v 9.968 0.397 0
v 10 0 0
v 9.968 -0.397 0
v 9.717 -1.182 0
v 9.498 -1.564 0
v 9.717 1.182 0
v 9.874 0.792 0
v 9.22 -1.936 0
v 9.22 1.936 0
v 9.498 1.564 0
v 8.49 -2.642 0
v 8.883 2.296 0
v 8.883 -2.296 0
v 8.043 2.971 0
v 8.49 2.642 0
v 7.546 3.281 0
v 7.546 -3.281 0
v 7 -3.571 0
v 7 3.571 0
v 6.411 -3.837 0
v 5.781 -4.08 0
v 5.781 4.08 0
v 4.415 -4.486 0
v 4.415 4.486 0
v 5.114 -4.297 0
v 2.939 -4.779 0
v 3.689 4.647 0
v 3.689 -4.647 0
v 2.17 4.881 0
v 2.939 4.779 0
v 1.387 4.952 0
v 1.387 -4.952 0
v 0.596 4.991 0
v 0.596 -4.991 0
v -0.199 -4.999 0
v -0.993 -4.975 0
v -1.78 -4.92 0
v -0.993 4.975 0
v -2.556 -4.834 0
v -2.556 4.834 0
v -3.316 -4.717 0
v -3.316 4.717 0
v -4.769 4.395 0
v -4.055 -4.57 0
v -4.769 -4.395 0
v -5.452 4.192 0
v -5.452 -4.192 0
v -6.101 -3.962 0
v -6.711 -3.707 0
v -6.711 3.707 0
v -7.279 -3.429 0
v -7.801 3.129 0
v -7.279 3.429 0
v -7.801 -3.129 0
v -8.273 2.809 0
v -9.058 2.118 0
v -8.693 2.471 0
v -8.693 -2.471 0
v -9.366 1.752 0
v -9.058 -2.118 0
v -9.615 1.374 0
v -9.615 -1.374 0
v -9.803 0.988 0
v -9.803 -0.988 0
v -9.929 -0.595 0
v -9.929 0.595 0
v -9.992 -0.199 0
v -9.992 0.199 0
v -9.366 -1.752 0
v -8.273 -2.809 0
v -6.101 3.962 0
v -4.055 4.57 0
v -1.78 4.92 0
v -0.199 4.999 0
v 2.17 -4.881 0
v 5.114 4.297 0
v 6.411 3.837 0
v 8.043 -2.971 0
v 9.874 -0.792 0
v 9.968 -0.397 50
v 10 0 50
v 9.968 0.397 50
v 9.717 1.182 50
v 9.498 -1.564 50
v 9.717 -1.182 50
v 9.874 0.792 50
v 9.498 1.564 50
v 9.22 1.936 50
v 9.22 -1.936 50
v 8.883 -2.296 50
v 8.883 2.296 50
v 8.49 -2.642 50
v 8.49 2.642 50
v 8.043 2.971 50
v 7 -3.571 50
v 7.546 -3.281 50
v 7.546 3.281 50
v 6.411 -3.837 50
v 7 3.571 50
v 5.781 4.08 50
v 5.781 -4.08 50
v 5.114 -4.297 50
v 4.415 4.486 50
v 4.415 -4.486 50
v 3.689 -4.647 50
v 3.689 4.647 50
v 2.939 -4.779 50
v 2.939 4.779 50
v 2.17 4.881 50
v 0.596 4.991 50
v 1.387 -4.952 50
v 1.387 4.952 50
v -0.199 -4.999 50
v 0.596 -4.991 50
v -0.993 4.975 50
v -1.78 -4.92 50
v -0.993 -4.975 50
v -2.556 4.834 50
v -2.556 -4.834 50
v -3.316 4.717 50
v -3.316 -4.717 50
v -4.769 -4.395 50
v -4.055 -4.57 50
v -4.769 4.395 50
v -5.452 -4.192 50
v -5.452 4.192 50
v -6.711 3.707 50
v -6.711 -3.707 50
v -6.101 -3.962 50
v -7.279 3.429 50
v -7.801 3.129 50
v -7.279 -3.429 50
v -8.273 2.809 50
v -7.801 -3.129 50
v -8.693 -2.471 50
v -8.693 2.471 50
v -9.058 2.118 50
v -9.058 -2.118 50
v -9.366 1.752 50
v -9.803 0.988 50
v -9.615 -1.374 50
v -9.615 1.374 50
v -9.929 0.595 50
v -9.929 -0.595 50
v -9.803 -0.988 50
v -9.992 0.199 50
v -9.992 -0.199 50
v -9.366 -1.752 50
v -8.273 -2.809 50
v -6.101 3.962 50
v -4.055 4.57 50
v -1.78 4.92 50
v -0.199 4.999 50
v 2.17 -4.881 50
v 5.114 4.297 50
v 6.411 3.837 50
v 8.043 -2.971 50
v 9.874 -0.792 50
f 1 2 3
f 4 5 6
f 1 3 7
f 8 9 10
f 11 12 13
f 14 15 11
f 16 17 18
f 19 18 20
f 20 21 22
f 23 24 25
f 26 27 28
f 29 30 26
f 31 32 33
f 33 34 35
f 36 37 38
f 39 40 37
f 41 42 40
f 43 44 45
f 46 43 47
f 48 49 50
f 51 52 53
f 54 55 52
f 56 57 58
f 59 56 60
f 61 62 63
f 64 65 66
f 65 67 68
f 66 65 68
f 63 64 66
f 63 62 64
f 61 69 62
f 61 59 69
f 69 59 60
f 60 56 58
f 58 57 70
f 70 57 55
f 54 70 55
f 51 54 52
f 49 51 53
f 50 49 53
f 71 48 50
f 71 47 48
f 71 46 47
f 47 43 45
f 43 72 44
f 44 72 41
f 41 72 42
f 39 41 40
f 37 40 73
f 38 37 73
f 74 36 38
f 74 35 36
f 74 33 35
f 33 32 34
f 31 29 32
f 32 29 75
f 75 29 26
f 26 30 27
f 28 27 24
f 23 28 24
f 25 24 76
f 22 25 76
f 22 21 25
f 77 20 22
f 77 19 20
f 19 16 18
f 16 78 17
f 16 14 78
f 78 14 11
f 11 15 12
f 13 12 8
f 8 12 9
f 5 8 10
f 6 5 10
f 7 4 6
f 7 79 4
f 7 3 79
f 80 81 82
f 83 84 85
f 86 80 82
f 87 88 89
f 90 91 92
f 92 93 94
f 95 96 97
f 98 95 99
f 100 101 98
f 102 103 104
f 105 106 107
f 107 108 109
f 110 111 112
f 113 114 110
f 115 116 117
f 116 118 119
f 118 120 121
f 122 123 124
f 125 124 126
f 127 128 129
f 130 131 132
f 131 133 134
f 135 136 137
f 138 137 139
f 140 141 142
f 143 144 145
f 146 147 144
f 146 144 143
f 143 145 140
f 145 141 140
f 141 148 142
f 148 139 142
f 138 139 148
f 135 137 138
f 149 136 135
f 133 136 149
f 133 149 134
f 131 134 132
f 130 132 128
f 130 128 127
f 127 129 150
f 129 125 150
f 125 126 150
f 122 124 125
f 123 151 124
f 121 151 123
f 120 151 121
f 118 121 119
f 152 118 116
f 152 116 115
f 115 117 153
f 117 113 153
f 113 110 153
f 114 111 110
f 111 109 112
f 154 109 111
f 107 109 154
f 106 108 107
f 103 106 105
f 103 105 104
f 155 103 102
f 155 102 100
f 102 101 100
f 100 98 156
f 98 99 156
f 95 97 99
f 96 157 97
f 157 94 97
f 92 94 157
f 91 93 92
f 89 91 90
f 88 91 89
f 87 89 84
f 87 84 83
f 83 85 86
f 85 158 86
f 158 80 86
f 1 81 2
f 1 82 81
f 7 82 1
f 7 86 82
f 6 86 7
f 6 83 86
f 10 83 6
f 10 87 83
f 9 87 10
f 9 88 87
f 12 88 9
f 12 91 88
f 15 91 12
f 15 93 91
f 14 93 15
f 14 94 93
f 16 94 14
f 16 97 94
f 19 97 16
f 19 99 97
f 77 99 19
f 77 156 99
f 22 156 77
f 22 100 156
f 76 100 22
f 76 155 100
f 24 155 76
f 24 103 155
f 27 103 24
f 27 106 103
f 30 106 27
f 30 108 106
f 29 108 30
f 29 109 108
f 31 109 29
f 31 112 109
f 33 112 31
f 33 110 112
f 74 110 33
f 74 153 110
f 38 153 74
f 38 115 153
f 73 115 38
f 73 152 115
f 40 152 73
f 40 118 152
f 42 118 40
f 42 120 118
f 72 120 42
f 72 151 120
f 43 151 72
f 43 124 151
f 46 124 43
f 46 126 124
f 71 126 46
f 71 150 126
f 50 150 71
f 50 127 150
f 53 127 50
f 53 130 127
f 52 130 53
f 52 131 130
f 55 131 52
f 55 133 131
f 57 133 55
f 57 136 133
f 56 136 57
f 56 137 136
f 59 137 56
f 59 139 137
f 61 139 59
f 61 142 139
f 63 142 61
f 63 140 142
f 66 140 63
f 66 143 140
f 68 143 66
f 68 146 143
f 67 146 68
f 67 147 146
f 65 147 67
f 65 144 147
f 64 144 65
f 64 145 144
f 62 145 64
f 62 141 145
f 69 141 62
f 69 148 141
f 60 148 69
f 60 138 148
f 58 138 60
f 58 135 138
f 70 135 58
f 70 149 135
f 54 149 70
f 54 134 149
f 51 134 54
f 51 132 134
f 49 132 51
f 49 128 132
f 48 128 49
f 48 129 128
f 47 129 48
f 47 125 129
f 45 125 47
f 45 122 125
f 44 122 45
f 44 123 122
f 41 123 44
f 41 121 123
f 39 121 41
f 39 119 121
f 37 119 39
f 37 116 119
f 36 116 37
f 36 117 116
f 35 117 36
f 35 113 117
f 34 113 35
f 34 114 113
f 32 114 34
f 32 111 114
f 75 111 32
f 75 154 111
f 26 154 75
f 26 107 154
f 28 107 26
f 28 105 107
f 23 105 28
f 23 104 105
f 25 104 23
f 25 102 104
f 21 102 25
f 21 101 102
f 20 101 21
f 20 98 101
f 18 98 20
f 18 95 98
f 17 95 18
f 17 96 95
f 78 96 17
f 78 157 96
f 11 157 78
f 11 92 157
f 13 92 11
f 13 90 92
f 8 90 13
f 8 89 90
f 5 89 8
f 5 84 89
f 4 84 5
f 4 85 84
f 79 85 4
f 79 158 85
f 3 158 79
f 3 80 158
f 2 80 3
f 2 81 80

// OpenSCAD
$fa=1;
$fs=0.4;

linear_extrude(height=50)
    scale([2, 1, 1])
        circle(d=10);
